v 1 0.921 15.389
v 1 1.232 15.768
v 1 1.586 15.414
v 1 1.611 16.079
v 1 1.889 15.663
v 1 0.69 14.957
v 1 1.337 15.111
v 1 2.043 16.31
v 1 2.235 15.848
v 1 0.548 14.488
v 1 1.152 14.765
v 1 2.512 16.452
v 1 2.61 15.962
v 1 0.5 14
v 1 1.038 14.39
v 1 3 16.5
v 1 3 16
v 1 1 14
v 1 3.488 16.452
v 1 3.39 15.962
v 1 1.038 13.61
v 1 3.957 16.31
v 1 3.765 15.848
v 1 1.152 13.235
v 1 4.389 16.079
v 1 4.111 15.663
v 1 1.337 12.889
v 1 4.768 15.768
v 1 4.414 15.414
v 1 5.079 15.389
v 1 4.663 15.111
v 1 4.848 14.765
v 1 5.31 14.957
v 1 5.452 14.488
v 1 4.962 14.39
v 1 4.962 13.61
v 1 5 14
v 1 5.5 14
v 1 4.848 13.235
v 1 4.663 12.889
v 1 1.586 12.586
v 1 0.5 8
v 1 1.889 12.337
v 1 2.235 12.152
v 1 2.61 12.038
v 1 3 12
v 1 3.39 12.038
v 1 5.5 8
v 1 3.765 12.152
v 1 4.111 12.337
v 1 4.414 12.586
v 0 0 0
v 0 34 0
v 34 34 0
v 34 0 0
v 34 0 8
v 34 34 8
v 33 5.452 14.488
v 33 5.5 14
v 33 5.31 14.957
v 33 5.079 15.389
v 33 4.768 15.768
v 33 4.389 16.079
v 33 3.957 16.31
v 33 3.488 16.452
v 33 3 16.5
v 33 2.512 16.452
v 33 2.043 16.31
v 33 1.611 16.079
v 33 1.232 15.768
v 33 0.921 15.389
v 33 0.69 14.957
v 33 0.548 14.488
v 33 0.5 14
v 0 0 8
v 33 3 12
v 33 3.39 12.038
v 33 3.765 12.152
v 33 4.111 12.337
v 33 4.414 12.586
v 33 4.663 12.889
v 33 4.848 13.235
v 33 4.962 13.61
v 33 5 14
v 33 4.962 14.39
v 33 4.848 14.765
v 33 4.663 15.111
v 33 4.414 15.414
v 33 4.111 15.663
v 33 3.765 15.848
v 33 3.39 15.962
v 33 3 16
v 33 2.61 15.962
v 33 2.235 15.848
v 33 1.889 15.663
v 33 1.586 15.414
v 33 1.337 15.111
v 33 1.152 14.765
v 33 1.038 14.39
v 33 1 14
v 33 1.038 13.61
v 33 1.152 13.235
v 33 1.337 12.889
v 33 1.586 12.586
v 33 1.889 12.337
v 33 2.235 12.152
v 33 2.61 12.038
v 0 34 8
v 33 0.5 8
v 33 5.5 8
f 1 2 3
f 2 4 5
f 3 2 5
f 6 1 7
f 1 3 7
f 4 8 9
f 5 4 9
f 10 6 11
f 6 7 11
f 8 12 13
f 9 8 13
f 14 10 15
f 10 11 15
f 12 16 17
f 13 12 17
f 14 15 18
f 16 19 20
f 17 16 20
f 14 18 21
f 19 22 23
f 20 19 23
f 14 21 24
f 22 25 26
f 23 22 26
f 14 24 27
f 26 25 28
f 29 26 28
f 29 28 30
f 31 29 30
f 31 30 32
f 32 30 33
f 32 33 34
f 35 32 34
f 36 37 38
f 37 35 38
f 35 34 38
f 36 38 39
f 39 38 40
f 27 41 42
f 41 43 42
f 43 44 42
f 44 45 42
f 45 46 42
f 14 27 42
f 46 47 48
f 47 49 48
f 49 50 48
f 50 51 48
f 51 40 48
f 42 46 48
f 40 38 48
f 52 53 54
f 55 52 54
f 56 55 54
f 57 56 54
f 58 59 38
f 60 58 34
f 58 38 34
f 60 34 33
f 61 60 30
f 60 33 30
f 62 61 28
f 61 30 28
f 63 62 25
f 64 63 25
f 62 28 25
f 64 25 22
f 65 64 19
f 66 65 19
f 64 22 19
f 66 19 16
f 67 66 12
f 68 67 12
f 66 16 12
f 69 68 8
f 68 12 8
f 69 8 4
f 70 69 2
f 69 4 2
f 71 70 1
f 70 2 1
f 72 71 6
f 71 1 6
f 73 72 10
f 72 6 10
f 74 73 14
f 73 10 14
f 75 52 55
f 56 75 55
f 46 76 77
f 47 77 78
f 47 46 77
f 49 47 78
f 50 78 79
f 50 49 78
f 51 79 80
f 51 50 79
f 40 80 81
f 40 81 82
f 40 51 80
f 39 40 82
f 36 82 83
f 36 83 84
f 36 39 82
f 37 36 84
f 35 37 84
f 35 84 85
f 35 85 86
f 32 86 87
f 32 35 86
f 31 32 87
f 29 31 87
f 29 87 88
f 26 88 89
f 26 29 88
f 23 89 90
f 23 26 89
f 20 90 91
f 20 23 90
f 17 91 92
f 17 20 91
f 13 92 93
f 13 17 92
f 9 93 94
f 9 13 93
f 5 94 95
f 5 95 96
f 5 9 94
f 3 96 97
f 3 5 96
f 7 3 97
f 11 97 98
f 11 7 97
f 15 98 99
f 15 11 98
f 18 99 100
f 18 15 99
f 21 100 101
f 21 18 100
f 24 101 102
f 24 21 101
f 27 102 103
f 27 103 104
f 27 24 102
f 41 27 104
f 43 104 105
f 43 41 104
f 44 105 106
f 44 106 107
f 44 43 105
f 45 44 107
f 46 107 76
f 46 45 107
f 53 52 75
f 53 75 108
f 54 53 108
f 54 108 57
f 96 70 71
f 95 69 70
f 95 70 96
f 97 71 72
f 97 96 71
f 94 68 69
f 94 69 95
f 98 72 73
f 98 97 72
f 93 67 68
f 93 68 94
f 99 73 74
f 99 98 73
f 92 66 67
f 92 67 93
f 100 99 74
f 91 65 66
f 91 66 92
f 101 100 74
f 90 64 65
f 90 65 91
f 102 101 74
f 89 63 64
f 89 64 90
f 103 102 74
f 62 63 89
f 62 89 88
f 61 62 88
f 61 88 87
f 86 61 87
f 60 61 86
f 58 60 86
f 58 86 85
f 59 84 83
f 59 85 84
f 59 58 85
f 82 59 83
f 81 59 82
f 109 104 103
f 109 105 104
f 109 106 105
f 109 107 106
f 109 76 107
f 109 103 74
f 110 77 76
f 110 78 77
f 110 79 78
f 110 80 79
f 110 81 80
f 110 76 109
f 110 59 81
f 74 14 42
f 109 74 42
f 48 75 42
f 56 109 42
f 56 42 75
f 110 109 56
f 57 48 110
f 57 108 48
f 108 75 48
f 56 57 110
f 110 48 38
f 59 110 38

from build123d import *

# Parameters (mm, degrees)
ESQUISSE1_W        = 34
ESQUISSE1_H        = 34
BOSS_EXTRU_1_DEPTH = 8
BOSS_EXTRU_2_START = 1
ESQUISSE2_R        = 2
BOSS_EXTRU_2_DEPTH = 32


with BuildPart() as part:
    # Esquisse1 → Boss.-Extru.1 (new body)
    with BuildSketch(Plane.XY):
        with Locations((17, 17)):
            Rectangle(ESQUISSE1_W, ESQUISSE1_H)
    extrude(amount=BOSS_EXTRU_1_DEPTH)

    # Esquisse2 → Boss.-Extru.2 (add)
    with BuildSketch(Plane(origin=(0, 0, 0), x_dir=(0, 0, -1), z_dir=(1, 0, 0)).offset(BOSS_EXTRU_2_START)):
        with BuildLine():
            Line((-8, 5.5), (-14, 5.5))
            ThreePointArc((-14, 5.5), (-16.5, 3), (-14, 0.5))
            Line((-14, 0.5), (-8, 0.5))
            Line((-8, 0.5), (-8, 5.5))
        make_face()
        with Locations((-14, 3)):
            Circle(ESQUISSE2_R, mode=Mode.SUBTRACT)
    extrude(amount=BOSS_EXTRU_2_DEPTH)


solid = part.part
